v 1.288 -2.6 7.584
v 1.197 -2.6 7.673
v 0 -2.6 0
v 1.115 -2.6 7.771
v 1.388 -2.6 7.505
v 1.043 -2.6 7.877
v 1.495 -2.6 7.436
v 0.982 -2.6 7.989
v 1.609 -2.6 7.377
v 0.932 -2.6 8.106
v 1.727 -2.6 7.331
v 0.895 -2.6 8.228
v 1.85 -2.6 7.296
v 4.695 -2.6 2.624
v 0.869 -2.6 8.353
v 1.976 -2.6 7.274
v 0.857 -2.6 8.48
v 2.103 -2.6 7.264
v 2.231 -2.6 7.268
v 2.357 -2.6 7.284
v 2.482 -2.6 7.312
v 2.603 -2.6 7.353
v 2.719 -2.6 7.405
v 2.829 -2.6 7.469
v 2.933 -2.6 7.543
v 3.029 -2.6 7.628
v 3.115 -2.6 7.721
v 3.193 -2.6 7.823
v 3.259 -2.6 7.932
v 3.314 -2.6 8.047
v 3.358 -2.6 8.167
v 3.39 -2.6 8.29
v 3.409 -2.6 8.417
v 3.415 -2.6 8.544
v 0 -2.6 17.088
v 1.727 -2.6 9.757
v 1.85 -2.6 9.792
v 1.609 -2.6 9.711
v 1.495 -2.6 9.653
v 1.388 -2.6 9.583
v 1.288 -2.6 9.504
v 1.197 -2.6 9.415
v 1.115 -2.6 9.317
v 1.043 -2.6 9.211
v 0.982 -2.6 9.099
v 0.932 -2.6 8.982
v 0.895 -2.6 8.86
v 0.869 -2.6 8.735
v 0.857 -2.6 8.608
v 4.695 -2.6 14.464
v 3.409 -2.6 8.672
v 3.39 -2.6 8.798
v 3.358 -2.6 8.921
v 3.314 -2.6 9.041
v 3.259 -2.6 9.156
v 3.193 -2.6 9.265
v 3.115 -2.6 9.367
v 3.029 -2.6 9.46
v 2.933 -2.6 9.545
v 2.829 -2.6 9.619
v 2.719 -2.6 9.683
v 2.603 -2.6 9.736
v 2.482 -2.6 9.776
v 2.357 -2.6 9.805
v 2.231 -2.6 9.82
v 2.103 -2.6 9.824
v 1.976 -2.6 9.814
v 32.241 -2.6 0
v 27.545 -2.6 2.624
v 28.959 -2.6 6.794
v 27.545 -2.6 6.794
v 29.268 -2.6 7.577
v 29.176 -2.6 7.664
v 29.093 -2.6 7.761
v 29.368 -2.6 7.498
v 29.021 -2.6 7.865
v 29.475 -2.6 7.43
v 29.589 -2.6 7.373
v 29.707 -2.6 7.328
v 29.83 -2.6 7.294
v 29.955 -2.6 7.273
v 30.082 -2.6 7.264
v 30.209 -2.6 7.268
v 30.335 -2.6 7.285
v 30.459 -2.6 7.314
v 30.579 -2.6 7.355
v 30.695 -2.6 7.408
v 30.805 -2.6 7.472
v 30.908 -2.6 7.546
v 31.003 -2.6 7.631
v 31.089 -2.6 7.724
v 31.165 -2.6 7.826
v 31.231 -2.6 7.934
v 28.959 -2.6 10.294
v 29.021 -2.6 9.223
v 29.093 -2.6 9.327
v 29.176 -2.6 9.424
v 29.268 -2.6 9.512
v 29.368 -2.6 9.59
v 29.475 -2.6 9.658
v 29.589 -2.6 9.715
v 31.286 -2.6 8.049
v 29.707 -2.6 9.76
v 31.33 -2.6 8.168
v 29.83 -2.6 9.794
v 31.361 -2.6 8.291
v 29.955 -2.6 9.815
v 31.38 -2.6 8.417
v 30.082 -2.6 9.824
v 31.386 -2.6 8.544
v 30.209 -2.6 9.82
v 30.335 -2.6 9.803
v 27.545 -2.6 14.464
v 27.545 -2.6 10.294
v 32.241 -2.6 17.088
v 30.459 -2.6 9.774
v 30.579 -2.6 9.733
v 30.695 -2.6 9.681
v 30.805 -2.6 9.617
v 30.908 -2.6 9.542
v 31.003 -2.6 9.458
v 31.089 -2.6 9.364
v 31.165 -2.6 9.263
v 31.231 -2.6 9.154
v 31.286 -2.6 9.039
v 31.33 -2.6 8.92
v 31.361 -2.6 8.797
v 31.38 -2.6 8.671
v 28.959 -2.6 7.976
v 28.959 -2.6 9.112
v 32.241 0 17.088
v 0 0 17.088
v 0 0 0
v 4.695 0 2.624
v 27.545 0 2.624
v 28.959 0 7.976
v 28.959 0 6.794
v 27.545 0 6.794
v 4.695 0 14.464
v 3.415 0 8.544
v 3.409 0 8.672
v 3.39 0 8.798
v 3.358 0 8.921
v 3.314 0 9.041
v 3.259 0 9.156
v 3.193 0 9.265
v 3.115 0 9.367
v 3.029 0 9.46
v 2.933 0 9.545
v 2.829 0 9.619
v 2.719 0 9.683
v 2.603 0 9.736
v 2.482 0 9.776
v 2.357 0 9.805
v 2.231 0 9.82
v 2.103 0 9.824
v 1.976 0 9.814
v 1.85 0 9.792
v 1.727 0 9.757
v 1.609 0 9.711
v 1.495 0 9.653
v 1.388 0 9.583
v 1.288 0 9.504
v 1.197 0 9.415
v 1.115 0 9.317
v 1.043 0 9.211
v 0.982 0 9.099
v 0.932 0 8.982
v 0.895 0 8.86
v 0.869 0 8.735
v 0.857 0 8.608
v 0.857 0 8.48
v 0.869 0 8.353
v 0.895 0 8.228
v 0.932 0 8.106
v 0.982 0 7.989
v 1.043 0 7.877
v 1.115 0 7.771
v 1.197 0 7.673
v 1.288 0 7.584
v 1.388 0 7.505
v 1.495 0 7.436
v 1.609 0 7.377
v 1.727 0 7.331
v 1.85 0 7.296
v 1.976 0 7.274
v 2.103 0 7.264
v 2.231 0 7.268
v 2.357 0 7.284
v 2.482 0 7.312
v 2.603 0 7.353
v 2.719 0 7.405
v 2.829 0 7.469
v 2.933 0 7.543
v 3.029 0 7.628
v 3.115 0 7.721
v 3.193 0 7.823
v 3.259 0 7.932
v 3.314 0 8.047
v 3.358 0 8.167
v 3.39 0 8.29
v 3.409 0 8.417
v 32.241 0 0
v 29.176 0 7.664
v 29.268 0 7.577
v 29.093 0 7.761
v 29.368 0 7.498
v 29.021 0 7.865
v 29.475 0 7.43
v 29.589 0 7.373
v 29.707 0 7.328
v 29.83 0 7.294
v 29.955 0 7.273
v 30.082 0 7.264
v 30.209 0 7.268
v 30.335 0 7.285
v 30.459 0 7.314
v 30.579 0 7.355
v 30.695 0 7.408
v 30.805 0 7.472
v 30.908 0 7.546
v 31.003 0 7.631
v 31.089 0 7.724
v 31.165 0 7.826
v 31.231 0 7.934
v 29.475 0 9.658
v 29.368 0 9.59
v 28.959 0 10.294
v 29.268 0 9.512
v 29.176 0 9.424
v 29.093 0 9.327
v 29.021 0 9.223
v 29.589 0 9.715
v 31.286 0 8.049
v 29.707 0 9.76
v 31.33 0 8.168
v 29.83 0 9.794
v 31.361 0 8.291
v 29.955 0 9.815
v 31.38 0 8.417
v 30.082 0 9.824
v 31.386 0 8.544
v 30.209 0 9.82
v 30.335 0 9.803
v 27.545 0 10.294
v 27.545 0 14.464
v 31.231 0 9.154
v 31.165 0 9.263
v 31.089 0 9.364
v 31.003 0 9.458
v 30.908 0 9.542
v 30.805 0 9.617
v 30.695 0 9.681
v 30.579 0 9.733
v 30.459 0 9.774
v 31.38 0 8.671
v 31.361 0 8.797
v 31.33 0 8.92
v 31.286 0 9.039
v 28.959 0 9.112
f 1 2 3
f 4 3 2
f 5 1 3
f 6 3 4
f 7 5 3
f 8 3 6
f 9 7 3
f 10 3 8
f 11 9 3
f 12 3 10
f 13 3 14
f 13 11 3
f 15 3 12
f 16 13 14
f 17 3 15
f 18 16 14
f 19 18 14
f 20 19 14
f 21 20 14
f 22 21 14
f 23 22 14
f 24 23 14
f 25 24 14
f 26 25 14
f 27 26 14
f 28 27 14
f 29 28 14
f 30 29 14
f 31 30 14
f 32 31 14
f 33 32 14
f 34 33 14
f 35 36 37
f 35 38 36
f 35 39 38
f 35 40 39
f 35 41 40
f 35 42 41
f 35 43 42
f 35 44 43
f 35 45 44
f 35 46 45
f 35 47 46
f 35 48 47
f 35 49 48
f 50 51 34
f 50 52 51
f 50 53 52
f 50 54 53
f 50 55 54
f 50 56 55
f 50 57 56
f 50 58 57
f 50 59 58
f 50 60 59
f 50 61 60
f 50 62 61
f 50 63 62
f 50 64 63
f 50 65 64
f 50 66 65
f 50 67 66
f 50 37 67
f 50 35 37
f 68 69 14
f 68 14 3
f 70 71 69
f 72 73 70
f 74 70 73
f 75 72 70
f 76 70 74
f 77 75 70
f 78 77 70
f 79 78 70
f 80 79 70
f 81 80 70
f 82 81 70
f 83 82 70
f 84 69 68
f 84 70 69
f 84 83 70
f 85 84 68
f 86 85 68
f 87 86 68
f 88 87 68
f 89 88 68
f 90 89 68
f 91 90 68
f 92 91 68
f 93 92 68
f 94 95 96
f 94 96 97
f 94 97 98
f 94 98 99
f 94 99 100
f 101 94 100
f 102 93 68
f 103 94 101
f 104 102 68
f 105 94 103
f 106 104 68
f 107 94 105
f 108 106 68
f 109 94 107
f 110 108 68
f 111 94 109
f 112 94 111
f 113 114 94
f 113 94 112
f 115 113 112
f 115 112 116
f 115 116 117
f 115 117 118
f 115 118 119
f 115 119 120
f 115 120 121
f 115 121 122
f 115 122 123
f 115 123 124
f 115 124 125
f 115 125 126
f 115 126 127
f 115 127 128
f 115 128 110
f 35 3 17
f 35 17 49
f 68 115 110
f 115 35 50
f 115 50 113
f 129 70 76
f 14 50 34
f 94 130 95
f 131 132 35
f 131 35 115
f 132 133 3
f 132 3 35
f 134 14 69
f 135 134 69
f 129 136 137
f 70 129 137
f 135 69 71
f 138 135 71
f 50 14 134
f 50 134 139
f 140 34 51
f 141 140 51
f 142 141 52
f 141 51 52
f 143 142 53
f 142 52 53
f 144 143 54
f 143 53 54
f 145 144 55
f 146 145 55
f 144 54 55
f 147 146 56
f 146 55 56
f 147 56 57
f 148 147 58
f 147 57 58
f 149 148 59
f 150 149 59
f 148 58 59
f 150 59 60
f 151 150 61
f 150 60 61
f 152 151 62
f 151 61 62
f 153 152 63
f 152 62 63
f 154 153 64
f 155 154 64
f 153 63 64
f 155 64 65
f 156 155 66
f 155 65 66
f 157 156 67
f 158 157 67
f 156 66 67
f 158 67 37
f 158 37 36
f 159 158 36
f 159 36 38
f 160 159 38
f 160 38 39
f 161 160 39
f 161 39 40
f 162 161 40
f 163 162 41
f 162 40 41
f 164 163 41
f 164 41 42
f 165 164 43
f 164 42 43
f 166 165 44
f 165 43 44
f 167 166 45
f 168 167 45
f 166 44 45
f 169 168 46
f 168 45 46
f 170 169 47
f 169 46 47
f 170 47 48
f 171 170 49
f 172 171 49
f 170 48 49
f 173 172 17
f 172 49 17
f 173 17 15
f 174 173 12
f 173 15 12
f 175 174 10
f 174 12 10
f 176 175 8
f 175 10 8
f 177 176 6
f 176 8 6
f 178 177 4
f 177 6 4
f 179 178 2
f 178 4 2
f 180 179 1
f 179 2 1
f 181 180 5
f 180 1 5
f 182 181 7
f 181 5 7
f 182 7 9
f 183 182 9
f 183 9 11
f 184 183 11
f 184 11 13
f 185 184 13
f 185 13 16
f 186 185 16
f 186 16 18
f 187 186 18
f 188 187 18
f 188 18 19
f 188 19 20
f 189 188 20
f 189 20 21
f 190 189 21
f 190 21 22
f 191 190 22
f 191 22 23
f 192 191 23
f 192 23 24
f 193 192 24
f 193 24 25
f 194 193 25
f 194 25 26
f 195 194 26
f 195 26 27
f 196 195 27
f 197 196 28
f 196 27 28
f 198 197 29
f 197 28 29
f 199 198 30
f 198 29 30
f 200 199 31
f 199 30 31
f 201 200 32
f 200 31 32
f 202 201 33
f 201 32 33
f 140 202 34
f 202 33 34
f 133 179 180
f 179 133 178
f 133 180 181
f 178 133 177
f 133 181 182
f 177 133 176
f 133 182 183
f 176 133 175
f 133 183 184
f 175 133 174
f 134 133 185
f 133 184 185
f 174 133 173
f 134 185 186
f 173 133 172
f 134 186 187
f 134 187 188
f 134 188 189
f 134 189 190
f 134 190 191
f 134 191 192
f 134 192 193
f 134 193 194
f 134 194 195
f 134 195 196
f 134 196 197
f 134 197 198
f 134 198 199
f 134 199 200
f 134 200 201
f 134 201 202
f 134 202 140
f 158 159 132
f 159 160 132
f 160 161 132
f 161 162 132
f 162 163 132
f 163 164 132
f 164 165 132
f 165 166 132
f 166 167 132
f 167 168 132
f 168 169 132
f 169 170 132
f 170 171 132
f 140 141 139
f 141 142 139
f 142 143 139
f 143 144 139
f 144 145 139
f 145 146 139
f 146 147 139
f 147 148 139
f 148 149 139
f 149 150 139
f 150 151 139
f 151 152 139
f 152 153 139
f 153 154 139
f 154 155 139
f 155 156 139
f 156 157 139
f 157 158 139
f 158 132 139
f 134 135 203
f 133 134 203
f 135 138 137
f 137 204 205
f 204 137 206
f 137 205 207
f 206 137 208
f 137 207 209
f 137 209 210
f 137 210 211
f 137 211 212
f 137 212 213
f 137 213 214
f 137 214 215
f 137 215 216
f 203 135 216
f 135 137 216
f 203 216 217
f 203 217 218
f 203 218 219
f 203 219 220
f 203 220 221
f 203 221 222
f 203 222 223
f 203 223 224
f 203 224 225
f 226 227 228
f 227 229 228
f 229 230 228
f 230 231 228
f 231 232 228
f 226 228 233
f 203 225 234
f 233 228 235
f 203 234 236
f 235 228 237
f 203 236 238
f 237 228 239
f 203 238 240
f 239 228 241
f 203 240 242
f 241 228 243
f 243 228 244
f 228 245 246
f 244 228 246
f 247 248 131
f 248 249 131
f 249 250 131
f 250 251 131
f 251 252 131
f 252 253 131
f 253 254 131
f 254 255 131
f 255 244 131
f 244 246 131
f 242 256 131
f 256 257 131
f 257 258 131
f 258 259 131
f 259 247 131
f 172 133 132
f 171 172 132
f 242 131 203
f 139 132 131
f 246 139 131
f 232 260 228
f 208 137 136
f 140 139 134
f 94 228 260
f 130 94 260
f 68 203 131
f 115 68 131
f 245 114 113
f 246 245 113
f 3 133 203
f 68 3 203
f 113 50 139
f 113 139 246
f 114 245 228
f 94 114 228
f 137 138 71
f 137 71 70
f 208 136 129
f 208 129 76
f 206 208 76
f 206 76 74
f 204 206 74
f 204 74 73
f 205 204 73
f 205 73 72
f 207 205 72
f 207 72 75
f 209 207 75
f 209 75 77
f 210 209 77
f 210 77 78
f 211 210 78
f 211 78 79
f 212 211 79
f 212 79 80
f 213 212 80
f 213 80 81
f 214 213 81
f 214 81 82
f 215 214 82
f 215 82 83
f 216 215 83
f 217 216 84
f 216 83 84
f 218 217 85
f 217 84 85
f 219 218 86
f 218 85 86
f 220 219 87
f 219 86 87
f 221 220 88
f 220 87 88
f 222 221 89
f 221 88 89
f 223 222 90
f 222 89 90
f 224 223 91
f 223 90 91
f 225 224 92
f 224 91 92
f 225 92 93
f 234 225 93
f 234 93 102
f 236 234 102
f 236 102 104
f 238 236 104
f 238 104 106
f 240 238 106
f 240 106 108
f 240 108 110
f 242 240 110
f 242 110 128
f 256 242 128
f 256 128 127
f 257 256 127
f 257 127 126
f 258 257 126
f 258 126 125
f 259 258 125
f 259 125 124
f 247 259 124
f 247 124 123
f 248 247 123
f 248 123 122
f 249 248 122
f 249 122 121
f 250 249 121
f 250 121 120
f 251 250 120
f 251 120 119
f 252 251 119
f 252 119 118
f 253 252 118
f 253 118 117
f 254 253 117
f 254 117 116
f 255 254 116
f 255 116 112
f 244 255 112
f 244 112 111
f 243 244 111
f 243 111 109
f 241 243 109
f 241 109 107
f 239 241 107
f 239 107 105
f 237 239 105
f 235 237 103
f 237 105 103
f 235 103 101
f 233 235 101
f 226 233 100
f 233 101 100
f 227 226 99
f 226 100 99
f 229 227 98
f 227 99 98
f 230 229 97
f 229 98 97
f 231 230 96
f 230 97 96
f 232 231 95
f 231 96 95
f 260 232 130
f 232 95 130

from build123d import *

# Parameters (mm, degrees)
SKETCH_W        = 32.240891
SKETCH_H        = 17.088121
PAD_DEPTH       = 2.6
SKETCH002_R     = 1.28
SKETCH002_W     = 22.850001
SKETCH002_H     = 11.84
POCKET_DEPTH    = 2.6
SKETCH003_W     = 2.01
SKETCH003_H     = 3.5
POCKET001_DEPTH = 5


with BuildPart() as part:
    # Sketch → Pad (new body)
    with BuildSketch(Plane.XZ):
        with Locations((16.120445, 8.54406)):
            Rectangle(SKETCH_W, SKETCH_H)
    extrude(amount=PAD_DEPTH)

    # Sketch002 (on Face6 of Pad) → Pocket (cut)
    with BuildSketch(Plane.XZ.offset(2.6)):
        with Locations((30.105934, 8.54406)):
            Circle(SKETCH002_R)
        with Locations((2.134957, 8.54406)):
            Circle(SKETCH002_R)
        with Locations((16.120445, 8.544061)):
            Rectangle(SKETCH002_W, SKETCH002_H)
    extrude(amount=-POCKET_DEPTH, mode=Mode.SUBTRACT)

    # Sketch003 (on Face4 of Pocket) → Pocket001 (cut)
    with BuildSketch(Plane(origin=(0, 0, 0), x_dir=(1, 0, 0), z_dir=(0, 1, 0))):
        with Locations((27.953742, -8.544061)):
            Rectangle(SKETCH003_W, SKETCH003_H)
    extrude(amount=-POCKET001_DEPTH, mode=Mode.SUBTRACT)


solid = part.part
